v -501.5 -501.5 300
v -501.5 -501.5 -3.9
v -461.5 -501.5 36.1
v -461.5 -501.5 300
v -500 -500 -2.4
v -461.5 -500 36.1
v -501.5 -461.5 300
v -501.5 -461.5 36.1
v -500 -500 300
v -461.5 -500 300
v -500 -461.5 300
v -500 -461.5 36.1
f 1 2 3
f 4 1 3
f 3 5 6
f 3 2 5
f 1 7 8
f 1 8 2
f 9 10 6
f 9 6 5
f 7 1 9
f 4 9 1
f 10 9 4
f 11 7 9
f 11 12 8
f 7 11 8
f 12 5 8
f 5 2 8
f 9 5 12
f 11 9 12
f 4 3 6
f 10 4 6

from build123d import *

# Parameters (mm, degrees)
AUFSATZ_LINEAR_AUSTRAGEN1_DEPTH = 303.9
SCHNITT_LINEAR_AUSTRAGEN1_DEPTH = 1.5
SCHNITT_LINEAR_AUSTRAGEN2_DEPTH = 1.5


with BuildPart() as part:
    # Skizze1 → Aufsatz-Linear austragen1 (new body)
    with BuildSketch(Plane(origin=(0, 0, 300), x_dir=(-1, 0, 0), z_dir=(0, 0, -1))):
        Polygon((461.5, -500), (500, -500), (500, -461.5), (501.5, -461.5), (501.5, -501.5), (461.5, -501.5), align=None)
    extrude(amount=AUFSATZ_LINEAR_AUSTRAGEN1_DEPTH)

    # Skizze2 → Schnitt-Linear austragen1 (cut)
    with BuildSketch(Plane.XZ.offset(501.5)):
        Polygon((-461.5, -3.9), (-501.5, -3.9), (-461.5, 36.1), align=None)
    extrude(amount=-SCHNITT_LINEAR_AUSTRAGEN1_DEPTH, mode=Mode.SUBTRACT)

    # Skizze3 → Schnitt-Linear austragen2 (cut)
    with BuildSketch(Plane.ZY.offset(501.5)):
        Polygon((-3.9, -461.5), (-3.9, -501.5), (36.1, -461.5), align=None)
    extrude(amount=-SCHNITT_LINEAR_AUSTRAGEN2_DEPTH, mode=Mode.SUBTRACT)


solid = part.part
